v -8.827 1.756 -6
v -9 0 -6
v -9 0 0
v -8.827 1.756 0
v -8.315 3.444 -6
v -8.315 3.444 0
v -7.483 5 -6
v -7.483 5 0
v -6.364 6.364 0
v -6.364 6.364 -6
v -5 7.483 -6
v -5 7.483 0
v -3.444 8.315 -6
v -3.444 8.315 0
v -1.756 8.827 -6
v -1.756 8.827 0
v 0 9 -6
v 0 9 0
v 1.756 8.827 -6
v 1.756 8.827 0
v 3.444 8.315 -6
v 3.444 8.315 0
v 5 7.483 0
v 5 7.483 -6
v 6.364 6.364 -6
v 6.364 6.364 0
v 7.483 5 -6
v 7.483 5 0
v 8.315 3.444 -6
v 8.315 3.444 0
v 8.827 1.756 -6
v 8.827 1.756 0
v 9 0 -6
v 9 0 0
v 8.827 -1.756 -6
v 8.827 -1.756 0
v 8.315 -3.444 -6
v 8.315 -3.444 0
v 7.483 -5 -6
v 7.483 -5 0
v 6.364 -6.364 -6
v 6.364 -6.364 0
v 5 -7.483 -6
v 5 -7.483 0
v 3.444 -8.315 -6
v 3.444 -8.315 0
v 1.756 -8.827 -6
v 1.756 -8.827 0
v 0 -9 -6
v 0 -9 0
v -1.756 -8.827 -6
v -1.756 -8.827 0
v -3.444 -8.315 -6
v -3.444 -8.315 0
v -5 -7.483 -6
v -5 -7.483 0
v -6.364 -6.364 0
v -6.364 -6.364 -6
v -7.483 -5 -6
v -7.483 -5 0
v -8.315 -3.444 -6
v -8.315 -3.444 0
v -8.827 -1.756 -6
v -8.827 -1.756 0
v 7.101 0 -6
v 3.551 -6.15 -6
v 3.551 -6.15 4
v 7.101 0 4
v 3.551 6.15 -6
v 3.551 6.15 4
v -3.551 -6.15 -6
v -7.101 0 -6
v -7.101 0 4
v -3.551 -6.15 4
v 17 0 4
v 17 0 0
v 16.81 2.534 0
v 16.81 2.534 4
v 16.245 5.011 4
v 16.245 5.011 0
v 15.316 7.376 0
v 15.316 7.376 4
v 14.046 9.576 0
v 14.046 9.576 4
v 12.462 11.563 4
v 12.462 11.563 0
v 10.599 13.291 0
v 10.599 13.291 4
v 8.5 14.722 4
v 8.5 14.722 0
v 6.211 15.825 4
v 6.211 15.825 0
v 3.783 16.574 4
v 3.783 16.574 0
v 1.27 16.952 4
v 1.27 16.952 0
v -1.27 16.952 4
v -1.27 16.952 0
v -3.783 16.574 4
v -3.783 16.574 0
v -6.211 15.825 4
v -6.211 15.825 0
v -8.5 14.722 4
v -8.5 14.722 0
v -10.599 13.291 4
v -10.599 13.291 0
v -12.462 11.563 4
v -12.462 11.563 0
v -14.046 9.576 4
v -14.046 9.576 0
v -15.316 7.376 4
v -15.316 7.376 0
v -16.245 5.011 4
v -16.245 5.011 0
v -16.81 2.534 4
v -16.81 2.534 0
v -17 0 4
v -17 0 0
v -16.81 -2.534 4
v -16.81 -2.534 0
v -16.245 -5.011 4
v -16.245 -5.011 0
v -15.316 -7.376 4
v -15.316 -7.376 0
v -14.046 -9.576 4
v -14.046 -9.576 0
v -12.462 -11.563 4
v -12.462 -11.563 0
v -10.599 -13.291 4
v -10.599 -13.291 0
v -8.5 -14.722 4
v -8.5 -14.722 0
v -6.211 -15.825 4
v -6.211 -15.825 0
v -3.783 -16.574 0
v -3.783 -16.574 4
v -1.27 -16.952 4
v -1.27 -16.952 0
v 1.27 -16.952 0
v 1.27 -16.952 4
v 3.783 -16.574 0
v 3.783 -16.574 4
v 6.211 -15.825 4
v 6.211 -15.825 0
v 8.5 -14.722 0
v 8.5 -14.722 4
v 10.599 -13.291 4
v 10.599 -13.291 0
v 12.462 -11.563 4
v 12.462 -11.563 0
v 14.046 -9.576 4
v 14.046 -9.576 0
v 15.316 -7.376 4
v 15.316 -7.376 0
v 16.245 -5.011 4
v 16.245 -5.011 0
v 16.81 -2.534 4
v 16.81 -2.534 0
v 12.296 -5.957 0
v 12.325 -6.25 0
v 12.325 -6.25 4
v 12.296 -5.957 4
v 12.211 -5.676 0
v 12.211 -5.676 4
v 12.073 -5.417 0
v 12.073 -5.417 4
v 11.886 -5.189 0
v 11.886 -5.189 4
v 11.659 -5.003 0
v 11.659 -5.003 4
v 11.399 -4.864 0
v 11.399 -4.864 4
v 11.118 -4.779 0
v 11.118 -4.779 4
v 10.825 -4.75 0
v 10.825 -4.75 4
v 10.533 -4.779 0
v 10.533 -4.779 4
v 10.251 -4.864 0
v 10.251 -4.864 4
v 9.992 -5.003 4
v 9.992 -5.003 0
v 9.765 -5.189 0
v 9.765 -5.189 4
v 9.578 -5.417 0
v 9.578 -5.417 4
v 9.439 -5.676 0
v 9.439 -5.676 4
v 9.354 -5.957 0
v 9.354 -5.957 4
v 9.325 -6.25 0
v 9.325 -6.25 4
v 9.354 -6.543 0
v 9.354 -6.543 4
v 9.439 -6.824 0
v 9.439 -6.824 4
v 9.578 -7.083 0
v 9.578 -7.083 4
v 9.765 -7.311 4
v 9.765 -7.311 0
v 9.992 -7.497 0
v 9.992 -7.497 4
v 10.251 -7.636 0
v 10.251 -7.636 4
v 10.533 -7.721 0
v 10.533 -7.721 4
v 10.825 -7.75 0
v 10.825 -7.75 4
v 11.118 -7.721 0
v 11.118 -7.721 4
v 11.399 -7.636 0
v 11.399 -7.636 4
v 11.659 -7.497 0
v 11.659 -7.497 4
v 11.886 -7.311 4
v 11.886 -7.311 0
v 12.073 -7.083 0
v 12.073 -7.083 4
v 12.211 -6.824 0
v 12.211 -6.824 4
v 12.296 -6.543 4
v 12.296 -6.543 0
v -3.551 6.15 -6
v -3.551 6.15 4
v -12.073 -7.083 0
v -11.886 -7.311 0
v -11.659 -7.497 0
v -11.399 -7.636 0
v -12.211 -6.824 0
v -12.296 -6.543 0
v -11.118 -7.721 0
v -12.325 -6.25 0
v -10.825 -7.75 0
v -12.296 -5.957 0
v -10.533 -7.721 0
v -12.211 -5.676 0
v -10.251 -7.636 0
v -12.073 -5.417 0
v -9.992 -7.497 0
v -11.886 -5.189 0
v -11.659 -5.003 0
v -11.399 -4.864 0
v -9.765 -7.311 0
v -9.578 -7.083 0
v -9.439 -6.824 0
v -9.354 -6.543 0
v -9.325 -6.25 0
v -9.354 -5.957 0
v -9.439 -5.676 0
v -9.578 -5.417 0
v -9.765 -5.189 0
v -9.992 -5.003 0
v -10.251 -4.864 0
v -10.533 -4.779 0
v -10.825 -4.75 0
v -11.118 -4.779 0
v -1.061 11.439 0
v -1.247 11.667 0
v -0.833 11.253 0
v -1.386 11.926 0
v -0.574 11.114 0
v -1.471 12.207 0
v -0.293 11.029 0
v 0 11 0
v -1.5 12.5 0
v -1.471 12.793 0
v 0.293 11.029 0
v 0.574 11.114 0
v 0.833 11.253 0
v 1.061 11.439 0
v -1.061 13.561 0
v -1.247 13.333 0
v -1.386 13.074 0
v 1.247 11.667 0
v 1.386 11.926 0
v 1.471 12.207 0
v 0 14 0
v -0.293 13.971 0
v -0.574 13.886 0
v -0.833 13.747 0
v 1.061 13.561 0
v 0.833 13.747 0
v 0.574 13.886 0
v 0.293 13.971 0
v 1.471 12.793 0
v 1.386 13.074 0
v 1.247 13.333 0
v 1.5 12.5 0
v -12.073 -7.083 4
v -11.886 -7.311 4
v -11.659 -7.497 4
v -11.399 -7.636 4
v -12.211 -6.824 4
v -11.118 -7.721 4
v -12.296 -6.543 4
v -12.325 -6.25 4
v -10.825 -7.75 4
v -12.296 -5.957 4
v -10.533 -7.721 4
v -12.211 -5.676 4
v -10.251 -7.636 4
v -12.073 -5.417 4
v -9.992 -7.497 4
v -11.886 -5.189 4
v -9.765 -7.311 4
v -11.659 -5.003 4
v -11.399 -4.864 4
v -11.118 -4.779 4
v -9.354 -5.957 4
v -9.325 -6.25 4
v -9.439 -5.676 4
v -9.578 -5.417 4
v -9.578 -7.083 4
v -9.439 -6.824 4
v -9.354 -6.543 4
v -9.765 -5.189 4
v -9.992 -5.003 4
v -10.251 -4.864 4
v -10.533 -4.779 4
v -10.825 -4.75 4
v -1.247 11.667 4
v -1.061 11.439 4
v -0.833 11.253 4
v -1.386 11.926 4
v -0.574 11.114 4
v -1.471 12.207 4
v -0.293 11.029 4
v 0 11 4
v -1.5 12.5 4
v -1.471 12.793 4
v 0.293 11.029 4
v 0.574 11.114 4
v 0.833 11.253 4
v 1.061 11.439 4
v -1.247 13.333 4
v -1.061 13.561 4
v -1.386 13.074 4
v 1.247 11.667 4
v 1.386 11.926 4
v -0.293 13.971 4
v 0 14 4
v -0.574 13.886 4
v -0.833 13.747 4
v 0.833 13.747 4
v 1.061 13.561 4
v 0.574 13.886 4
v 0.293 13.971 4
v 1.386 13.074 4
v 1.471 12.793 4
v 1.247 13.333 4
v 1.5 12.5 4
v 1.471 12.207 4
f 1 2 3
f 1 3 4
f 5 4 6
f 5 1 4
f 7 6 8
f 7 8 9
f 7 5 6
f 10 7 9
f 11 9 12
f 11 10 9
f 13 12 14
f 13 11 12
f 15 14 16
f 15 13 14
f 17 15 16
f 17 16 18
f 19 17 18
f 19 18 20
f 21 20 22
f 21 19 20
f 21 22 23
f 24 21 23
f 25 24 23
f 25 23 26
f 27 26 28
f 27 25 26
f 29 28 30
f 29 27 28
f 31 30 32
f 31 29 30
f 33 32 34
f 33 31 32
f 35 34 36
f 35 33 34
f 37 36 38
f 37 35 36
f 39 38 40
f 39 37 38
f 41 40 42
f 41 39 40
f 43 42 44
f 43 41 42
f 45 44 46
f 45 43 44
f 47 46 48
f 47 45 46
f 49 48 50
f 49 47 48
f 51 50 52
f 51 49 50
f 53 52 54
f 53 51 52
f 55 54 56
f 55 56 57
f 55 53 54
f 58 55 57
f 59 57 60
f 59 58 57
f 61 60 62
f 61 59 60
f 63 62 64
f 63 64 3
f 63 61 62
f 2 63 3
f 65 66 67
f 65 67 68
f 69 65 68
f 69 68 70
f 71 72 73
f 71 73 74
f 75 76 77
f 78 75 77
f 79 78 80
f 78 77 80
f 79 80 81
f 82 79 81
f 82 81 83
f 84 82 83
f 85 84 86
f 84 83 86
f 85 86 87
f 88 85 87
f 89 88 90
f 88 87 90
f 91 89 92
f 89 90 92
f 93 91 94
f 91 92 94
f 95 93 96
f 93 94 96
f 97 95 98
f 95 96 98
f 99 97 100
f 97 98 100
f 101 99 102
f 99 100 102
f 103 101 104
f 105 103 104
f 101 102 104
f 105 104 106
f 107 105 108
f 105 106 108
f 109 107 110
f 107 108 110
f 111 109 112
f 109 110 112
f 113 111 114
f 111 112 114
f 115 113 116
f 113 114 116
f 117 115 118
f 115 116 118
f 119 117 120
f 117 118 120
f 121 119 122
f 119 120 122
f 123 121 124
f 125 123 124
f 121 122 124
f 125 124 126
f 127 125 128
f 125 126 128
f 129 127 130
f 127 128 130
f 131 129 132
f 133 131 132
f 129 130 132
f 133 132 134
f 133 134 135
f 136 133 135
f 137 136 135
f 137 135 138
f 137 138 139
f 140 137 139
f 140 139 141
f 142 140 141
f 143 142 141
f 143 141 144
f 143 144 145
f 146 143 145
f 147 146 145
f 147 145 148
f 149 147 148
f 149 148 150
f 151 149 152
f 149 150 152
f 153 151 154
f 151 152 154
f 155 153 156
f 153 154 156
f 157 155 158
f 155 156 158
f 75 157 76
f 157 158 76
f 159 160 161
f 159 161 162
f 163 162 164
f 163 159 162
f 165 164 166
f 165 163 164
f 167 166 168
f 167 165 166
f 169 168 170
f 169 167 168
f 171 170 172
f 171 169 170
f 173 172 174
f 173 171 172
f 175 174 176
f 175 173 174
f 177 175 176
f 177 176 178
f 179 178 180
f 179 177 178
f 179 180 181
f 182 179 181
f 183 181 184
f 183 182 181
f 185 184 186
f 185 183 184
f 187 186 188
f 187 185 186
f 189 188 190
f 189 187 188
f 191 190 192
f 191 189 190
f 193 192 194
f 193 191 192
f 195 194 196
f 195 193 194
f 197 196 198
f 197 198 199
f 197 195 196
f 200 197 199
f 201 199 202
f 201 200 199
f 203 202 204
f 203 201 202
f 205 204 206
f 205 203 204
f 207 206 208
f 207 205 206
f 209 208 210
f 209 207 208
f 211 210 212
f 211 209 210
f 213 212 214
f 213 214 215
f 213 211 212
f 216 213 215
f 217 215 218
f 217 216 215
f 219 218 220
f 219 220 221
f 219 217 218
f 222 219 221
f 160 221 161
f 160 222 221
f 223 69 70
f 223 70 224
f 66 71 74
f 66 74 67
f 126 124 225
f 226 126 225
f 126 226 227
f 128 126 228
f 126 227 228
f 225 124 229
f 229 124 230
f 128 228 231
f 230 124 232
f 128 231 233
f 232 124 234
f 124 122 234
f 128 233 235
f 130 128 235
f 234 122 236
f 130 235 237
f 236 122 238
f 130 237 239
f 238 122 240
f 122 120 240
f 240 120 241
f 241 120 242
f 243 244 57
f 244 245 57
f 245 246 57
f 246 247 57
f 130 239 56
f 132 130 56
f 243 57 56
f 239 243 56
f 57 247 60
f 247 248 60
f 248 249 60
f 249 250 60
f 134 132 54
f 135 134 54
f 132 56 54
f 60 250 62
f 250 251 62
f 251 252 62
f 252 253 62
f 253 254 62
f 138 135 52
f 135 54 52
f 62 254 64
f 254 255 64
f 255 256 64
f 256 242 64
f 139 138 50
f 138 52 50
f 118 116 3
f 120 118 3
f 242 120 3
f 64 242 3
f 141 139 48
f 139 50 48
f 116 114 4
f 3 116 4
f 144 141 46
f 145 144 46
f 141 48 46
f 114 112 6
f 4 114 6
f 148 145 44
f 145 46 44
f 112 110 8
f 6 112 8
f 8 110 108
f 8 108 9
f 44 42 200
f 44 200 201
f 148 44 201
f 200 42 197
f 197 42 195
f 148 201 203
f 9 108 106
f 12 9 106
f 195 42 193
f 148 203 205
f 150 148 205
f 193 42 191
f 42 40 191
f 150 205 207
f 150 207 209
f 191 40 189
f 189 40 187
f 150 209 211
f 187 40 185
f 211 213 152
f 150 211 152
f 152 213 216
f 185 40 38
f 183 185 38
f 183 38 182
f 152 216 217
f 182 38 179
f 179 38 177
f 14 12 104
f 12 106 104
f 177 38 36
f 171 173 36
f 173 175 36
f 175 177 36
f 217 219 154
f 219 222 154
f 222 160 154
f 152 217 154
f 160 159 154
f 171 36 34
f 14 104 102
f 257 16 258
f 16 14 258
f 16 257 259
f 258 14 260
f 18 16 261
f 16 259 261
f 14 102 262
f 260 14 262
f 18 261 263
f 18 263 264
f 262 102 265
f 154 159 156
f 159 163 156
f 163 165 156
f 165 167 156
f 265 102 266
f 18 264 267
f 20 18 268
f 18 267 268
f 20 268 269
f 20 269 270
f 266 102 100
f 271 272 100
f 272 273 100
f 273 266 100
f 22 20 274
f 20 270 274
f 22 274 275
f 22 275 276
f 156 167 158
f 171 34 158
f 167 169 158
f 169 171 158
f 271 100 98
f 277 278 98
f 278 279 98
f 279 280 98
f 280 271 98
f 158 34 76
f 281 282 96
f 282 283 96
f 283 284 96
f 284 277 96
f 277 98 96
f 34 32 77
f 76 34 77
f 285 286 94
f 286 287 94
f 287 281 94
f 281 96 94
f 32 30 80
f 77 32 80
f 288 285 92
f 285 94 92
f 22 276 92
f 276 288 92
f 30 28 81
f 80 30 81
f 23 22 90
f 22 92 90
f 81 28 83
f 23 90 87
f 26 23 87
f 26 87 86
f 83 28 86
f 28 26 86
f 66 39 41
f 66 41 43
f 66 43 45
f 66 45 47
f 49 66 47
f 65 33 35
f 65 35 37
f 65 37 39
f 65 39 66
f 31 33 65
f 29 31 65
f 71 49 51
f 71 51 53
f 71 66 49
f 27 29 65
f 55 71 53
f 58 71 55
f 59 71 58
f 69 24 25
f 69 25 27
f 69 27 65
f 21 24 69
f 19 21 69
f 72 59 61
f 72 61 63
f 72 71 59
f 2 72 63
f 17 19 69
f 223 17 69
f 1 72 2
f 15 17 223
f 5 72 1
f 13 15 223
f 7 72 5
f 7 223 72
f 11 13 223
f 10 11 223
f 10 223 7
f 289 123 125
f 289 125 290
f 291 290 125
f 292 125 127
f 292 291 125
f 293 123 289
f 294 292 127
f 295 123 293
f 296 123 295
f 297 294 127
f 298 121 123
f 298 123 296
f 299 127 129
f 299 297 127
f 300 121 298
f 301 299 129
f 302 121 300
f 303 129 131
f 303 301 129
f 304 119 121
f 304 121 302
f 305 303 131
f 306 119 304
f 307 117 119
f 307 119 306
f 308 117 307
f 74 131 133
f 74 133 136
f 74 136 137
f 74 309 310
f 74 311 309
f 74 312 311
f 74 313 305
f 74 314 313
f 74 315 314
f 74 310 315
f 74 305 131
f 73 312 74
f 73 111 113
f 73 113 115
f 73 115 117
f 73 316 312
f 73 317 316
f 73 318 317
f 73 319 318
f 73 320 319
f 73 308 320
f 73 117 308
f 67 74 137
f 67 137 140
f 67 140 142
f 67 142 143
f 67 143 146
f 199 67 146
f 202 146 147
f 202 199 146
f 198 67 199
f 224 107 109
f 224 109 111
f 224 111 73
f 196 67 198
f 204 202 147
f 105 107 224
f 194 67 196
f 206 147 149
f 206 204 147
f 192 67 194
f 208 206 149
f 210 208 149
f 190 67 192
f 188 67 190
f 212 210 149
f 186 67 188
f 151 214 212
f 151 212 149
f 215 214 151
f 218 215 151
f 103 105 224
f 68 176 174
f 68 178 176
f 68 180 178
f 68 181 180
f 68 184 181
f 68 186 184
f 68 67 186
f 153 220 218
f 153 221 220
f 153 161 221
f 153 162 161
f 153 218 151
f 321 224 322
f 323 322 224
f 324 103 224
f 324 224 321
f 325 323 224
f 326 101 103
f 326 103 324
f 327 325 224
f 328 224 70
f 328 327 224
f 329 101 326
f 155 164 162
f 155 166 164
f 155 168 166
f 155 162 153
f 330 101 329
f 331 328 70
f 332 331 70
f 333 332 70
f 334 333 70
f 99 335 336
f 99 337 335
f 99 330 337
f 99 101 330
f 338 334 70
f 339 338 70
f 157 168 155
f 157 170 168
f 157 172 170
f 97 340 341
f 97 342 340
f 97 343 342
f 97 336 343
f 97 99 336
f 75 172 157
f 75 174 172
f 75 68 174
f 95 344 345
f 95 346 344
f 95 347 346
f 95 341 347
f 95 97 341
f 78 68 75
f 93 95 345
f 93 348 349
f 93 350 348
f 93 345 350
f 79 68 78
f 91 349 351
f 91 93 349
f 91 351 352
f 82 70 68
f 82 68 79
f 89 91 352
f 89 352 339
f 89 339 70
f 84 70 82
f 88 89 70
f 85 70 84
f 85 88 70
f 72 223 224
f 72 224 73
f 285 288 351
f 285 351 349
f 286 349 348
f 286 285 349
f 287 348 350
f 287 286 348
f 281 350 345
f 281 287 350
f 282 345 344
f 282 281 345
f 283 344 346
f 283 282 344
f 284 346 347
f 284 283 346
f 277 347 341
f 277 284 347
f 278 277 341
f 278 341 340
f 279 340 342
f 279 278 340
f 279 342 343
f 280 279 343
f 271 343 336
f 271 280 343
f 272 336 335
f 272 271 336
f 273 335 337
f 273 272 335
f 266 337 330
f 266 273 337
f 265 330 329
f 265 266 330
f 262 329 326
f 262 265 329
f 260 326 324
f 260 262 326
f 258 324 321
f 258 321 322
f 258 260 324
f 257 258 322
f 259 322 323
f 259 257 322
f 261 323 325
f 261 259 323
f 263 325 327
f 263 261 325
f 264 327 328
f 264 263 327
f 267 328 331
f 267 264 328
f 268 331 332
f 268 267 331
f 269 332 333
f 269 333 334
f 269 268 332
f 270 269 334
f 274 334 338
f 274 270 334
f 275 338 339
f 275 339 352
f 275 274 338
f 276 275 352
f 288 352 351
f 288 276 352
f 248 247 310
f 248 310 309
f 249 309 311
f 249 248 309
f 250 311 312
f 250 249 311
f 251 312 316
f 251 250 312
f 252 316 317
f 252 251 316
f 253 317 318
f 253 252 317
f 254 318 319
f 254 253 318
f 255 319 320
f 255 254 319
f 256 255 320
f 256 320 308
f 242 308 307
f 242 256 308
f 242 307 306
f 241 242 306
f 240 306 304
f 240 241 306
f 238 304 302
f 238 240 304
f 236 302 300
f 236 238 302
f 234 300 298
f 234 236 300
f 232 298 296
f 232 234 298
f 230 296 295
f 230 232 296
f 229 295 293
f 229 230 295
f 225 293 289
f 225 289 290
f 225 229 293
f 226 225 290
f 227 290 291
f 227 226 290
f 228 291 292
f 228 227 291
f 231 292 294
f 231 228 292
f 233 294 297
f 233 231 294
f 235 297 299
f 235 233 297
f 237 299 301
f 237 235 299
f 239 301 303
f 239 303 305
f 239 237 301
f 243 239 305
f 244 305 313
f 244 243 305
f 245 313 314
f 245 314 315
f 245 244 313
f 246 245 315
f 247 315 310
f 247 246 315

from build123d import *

# Parameters (mm, degrees)
CROQUIS1_R              = 17
CROQUIS1_R_2            = 1.5
SALIENTE_EXTRUIR1_DEPTH = 4
CORTAR_EXTRUIR1_DEPTH   = 4
SALIENTE_EXTRUIR2_START = 6
CROQUIS3_R              = 9
CROQUIS3_R_2            = 1.5
SALIENTE_EXTRUIR2_DEPTH = 6


with BuildPart() as part:
    # Croquis1 → Saliente-Extruir1 (new body)
    with BuildSketch(Plane.XY):
        Circle(CROQUIS1_R)
        with Locations((0, 12.5)):
            Circle(CROQUIS1_R_2, mode=Mode.SUBTRACT)
        with Locations((10.825317547, -6.25)):
            Circle(CROQUIS1_R_2, mode=Mode.SUBTRACT)
        with Locations((-10.825317547, -6.25)):
            Circle(CROQUIS1_R_2, mode=Mode.SUBTRACT)
    extrude(amount=SALIENTE_EXTRUIR1_DEPTH)

    # Croquis2 → Cortar-Extruir1 (cut)
    with BuildSketch(Plane(origin=(0, 0, 0), x_dir=(-1, 0, 0), z_dir=(0, 0, -1))):
        Polygon((3.550704156, 6.15), (-3.550704156, 6.15), (-7.101408311, 0), (-3.550704156, -6.15), (3.550704156, -6.15), (7.101408311, 0), align=None)
    extrude(amount=-CORTAR_EXTRUIR1_DEPTH, mode=Mode.SUBTRACT)

    # Croquis3 → Saliente-Extruir2 (add)
    # profile 1 of 4: a face of its own
    with BuildSketch(Plane(origin=(0, 0, 0), x_dir=(-1, 0, 0), z_dir=(0, 0, -1)).offset(SALIENTE_EXTRUIR2_START)):
        Circle(CROQUIS3_R)
        Polygon((-7.101408311, 0), (-3.550704156, 6.15), (3.550704156, 6.15), (7.101408311, 0), (3.550704156, -6.15), (-3.550704156, -6.15), align=None, mode=Mode.SUBTRACT)
    # profile 2 of 4: a face of its own
    with BuildSketch(Plane(origin=(0, 0, 0), x_dir=(-1, 0, 0), z_dir=(0, 0, -1)).offset(SALIENTE_EXTRUIR2_START)):
        with Locations(Location((0, 12.5, 0), (0, 0, 180))):
            Circle(CROQUIS3_R_2)
    # profile 3 of 4: a face of its own
    with BuildSketch(Plane(origin=(0, 0, 0), x_dir=(-1, 0, 0), z_dir=(0, 0, -1)).offset(SALIENTE_EXTRUIR2_START)):
        with Locations(Location((-10.825317547, -6.25, 0), (0, 0, 180))):
            Circle(CROQUIS3_R_2)
    # profile 4 of 4: a face of its own
    with BuildSketch(Plane(origin=(0, 0, 0), x_dir=(-1, 0, 0), z_dir=(0, 0, -1)).offset(SALIENTE_EXTRUIR2_START)):
        with Locations(Location((10.825317547, -6.25, 0), (0, 0, 180))):
            Circle(CROQUIS3_R_2)
    extrude(amount=-SALIENTE_EXTRUIR2_DEPTH)


with BuildPart() as saliente_extruir2_kept_piece:
    # of the separate pieces the step leaves, the one the design keeps (saliente_extruir2_pieces_kept)
    add(part.part.solids().sort_by_distance((17, 0, 0))[0])


solid = saliente_extruir2_kept_piece.part
